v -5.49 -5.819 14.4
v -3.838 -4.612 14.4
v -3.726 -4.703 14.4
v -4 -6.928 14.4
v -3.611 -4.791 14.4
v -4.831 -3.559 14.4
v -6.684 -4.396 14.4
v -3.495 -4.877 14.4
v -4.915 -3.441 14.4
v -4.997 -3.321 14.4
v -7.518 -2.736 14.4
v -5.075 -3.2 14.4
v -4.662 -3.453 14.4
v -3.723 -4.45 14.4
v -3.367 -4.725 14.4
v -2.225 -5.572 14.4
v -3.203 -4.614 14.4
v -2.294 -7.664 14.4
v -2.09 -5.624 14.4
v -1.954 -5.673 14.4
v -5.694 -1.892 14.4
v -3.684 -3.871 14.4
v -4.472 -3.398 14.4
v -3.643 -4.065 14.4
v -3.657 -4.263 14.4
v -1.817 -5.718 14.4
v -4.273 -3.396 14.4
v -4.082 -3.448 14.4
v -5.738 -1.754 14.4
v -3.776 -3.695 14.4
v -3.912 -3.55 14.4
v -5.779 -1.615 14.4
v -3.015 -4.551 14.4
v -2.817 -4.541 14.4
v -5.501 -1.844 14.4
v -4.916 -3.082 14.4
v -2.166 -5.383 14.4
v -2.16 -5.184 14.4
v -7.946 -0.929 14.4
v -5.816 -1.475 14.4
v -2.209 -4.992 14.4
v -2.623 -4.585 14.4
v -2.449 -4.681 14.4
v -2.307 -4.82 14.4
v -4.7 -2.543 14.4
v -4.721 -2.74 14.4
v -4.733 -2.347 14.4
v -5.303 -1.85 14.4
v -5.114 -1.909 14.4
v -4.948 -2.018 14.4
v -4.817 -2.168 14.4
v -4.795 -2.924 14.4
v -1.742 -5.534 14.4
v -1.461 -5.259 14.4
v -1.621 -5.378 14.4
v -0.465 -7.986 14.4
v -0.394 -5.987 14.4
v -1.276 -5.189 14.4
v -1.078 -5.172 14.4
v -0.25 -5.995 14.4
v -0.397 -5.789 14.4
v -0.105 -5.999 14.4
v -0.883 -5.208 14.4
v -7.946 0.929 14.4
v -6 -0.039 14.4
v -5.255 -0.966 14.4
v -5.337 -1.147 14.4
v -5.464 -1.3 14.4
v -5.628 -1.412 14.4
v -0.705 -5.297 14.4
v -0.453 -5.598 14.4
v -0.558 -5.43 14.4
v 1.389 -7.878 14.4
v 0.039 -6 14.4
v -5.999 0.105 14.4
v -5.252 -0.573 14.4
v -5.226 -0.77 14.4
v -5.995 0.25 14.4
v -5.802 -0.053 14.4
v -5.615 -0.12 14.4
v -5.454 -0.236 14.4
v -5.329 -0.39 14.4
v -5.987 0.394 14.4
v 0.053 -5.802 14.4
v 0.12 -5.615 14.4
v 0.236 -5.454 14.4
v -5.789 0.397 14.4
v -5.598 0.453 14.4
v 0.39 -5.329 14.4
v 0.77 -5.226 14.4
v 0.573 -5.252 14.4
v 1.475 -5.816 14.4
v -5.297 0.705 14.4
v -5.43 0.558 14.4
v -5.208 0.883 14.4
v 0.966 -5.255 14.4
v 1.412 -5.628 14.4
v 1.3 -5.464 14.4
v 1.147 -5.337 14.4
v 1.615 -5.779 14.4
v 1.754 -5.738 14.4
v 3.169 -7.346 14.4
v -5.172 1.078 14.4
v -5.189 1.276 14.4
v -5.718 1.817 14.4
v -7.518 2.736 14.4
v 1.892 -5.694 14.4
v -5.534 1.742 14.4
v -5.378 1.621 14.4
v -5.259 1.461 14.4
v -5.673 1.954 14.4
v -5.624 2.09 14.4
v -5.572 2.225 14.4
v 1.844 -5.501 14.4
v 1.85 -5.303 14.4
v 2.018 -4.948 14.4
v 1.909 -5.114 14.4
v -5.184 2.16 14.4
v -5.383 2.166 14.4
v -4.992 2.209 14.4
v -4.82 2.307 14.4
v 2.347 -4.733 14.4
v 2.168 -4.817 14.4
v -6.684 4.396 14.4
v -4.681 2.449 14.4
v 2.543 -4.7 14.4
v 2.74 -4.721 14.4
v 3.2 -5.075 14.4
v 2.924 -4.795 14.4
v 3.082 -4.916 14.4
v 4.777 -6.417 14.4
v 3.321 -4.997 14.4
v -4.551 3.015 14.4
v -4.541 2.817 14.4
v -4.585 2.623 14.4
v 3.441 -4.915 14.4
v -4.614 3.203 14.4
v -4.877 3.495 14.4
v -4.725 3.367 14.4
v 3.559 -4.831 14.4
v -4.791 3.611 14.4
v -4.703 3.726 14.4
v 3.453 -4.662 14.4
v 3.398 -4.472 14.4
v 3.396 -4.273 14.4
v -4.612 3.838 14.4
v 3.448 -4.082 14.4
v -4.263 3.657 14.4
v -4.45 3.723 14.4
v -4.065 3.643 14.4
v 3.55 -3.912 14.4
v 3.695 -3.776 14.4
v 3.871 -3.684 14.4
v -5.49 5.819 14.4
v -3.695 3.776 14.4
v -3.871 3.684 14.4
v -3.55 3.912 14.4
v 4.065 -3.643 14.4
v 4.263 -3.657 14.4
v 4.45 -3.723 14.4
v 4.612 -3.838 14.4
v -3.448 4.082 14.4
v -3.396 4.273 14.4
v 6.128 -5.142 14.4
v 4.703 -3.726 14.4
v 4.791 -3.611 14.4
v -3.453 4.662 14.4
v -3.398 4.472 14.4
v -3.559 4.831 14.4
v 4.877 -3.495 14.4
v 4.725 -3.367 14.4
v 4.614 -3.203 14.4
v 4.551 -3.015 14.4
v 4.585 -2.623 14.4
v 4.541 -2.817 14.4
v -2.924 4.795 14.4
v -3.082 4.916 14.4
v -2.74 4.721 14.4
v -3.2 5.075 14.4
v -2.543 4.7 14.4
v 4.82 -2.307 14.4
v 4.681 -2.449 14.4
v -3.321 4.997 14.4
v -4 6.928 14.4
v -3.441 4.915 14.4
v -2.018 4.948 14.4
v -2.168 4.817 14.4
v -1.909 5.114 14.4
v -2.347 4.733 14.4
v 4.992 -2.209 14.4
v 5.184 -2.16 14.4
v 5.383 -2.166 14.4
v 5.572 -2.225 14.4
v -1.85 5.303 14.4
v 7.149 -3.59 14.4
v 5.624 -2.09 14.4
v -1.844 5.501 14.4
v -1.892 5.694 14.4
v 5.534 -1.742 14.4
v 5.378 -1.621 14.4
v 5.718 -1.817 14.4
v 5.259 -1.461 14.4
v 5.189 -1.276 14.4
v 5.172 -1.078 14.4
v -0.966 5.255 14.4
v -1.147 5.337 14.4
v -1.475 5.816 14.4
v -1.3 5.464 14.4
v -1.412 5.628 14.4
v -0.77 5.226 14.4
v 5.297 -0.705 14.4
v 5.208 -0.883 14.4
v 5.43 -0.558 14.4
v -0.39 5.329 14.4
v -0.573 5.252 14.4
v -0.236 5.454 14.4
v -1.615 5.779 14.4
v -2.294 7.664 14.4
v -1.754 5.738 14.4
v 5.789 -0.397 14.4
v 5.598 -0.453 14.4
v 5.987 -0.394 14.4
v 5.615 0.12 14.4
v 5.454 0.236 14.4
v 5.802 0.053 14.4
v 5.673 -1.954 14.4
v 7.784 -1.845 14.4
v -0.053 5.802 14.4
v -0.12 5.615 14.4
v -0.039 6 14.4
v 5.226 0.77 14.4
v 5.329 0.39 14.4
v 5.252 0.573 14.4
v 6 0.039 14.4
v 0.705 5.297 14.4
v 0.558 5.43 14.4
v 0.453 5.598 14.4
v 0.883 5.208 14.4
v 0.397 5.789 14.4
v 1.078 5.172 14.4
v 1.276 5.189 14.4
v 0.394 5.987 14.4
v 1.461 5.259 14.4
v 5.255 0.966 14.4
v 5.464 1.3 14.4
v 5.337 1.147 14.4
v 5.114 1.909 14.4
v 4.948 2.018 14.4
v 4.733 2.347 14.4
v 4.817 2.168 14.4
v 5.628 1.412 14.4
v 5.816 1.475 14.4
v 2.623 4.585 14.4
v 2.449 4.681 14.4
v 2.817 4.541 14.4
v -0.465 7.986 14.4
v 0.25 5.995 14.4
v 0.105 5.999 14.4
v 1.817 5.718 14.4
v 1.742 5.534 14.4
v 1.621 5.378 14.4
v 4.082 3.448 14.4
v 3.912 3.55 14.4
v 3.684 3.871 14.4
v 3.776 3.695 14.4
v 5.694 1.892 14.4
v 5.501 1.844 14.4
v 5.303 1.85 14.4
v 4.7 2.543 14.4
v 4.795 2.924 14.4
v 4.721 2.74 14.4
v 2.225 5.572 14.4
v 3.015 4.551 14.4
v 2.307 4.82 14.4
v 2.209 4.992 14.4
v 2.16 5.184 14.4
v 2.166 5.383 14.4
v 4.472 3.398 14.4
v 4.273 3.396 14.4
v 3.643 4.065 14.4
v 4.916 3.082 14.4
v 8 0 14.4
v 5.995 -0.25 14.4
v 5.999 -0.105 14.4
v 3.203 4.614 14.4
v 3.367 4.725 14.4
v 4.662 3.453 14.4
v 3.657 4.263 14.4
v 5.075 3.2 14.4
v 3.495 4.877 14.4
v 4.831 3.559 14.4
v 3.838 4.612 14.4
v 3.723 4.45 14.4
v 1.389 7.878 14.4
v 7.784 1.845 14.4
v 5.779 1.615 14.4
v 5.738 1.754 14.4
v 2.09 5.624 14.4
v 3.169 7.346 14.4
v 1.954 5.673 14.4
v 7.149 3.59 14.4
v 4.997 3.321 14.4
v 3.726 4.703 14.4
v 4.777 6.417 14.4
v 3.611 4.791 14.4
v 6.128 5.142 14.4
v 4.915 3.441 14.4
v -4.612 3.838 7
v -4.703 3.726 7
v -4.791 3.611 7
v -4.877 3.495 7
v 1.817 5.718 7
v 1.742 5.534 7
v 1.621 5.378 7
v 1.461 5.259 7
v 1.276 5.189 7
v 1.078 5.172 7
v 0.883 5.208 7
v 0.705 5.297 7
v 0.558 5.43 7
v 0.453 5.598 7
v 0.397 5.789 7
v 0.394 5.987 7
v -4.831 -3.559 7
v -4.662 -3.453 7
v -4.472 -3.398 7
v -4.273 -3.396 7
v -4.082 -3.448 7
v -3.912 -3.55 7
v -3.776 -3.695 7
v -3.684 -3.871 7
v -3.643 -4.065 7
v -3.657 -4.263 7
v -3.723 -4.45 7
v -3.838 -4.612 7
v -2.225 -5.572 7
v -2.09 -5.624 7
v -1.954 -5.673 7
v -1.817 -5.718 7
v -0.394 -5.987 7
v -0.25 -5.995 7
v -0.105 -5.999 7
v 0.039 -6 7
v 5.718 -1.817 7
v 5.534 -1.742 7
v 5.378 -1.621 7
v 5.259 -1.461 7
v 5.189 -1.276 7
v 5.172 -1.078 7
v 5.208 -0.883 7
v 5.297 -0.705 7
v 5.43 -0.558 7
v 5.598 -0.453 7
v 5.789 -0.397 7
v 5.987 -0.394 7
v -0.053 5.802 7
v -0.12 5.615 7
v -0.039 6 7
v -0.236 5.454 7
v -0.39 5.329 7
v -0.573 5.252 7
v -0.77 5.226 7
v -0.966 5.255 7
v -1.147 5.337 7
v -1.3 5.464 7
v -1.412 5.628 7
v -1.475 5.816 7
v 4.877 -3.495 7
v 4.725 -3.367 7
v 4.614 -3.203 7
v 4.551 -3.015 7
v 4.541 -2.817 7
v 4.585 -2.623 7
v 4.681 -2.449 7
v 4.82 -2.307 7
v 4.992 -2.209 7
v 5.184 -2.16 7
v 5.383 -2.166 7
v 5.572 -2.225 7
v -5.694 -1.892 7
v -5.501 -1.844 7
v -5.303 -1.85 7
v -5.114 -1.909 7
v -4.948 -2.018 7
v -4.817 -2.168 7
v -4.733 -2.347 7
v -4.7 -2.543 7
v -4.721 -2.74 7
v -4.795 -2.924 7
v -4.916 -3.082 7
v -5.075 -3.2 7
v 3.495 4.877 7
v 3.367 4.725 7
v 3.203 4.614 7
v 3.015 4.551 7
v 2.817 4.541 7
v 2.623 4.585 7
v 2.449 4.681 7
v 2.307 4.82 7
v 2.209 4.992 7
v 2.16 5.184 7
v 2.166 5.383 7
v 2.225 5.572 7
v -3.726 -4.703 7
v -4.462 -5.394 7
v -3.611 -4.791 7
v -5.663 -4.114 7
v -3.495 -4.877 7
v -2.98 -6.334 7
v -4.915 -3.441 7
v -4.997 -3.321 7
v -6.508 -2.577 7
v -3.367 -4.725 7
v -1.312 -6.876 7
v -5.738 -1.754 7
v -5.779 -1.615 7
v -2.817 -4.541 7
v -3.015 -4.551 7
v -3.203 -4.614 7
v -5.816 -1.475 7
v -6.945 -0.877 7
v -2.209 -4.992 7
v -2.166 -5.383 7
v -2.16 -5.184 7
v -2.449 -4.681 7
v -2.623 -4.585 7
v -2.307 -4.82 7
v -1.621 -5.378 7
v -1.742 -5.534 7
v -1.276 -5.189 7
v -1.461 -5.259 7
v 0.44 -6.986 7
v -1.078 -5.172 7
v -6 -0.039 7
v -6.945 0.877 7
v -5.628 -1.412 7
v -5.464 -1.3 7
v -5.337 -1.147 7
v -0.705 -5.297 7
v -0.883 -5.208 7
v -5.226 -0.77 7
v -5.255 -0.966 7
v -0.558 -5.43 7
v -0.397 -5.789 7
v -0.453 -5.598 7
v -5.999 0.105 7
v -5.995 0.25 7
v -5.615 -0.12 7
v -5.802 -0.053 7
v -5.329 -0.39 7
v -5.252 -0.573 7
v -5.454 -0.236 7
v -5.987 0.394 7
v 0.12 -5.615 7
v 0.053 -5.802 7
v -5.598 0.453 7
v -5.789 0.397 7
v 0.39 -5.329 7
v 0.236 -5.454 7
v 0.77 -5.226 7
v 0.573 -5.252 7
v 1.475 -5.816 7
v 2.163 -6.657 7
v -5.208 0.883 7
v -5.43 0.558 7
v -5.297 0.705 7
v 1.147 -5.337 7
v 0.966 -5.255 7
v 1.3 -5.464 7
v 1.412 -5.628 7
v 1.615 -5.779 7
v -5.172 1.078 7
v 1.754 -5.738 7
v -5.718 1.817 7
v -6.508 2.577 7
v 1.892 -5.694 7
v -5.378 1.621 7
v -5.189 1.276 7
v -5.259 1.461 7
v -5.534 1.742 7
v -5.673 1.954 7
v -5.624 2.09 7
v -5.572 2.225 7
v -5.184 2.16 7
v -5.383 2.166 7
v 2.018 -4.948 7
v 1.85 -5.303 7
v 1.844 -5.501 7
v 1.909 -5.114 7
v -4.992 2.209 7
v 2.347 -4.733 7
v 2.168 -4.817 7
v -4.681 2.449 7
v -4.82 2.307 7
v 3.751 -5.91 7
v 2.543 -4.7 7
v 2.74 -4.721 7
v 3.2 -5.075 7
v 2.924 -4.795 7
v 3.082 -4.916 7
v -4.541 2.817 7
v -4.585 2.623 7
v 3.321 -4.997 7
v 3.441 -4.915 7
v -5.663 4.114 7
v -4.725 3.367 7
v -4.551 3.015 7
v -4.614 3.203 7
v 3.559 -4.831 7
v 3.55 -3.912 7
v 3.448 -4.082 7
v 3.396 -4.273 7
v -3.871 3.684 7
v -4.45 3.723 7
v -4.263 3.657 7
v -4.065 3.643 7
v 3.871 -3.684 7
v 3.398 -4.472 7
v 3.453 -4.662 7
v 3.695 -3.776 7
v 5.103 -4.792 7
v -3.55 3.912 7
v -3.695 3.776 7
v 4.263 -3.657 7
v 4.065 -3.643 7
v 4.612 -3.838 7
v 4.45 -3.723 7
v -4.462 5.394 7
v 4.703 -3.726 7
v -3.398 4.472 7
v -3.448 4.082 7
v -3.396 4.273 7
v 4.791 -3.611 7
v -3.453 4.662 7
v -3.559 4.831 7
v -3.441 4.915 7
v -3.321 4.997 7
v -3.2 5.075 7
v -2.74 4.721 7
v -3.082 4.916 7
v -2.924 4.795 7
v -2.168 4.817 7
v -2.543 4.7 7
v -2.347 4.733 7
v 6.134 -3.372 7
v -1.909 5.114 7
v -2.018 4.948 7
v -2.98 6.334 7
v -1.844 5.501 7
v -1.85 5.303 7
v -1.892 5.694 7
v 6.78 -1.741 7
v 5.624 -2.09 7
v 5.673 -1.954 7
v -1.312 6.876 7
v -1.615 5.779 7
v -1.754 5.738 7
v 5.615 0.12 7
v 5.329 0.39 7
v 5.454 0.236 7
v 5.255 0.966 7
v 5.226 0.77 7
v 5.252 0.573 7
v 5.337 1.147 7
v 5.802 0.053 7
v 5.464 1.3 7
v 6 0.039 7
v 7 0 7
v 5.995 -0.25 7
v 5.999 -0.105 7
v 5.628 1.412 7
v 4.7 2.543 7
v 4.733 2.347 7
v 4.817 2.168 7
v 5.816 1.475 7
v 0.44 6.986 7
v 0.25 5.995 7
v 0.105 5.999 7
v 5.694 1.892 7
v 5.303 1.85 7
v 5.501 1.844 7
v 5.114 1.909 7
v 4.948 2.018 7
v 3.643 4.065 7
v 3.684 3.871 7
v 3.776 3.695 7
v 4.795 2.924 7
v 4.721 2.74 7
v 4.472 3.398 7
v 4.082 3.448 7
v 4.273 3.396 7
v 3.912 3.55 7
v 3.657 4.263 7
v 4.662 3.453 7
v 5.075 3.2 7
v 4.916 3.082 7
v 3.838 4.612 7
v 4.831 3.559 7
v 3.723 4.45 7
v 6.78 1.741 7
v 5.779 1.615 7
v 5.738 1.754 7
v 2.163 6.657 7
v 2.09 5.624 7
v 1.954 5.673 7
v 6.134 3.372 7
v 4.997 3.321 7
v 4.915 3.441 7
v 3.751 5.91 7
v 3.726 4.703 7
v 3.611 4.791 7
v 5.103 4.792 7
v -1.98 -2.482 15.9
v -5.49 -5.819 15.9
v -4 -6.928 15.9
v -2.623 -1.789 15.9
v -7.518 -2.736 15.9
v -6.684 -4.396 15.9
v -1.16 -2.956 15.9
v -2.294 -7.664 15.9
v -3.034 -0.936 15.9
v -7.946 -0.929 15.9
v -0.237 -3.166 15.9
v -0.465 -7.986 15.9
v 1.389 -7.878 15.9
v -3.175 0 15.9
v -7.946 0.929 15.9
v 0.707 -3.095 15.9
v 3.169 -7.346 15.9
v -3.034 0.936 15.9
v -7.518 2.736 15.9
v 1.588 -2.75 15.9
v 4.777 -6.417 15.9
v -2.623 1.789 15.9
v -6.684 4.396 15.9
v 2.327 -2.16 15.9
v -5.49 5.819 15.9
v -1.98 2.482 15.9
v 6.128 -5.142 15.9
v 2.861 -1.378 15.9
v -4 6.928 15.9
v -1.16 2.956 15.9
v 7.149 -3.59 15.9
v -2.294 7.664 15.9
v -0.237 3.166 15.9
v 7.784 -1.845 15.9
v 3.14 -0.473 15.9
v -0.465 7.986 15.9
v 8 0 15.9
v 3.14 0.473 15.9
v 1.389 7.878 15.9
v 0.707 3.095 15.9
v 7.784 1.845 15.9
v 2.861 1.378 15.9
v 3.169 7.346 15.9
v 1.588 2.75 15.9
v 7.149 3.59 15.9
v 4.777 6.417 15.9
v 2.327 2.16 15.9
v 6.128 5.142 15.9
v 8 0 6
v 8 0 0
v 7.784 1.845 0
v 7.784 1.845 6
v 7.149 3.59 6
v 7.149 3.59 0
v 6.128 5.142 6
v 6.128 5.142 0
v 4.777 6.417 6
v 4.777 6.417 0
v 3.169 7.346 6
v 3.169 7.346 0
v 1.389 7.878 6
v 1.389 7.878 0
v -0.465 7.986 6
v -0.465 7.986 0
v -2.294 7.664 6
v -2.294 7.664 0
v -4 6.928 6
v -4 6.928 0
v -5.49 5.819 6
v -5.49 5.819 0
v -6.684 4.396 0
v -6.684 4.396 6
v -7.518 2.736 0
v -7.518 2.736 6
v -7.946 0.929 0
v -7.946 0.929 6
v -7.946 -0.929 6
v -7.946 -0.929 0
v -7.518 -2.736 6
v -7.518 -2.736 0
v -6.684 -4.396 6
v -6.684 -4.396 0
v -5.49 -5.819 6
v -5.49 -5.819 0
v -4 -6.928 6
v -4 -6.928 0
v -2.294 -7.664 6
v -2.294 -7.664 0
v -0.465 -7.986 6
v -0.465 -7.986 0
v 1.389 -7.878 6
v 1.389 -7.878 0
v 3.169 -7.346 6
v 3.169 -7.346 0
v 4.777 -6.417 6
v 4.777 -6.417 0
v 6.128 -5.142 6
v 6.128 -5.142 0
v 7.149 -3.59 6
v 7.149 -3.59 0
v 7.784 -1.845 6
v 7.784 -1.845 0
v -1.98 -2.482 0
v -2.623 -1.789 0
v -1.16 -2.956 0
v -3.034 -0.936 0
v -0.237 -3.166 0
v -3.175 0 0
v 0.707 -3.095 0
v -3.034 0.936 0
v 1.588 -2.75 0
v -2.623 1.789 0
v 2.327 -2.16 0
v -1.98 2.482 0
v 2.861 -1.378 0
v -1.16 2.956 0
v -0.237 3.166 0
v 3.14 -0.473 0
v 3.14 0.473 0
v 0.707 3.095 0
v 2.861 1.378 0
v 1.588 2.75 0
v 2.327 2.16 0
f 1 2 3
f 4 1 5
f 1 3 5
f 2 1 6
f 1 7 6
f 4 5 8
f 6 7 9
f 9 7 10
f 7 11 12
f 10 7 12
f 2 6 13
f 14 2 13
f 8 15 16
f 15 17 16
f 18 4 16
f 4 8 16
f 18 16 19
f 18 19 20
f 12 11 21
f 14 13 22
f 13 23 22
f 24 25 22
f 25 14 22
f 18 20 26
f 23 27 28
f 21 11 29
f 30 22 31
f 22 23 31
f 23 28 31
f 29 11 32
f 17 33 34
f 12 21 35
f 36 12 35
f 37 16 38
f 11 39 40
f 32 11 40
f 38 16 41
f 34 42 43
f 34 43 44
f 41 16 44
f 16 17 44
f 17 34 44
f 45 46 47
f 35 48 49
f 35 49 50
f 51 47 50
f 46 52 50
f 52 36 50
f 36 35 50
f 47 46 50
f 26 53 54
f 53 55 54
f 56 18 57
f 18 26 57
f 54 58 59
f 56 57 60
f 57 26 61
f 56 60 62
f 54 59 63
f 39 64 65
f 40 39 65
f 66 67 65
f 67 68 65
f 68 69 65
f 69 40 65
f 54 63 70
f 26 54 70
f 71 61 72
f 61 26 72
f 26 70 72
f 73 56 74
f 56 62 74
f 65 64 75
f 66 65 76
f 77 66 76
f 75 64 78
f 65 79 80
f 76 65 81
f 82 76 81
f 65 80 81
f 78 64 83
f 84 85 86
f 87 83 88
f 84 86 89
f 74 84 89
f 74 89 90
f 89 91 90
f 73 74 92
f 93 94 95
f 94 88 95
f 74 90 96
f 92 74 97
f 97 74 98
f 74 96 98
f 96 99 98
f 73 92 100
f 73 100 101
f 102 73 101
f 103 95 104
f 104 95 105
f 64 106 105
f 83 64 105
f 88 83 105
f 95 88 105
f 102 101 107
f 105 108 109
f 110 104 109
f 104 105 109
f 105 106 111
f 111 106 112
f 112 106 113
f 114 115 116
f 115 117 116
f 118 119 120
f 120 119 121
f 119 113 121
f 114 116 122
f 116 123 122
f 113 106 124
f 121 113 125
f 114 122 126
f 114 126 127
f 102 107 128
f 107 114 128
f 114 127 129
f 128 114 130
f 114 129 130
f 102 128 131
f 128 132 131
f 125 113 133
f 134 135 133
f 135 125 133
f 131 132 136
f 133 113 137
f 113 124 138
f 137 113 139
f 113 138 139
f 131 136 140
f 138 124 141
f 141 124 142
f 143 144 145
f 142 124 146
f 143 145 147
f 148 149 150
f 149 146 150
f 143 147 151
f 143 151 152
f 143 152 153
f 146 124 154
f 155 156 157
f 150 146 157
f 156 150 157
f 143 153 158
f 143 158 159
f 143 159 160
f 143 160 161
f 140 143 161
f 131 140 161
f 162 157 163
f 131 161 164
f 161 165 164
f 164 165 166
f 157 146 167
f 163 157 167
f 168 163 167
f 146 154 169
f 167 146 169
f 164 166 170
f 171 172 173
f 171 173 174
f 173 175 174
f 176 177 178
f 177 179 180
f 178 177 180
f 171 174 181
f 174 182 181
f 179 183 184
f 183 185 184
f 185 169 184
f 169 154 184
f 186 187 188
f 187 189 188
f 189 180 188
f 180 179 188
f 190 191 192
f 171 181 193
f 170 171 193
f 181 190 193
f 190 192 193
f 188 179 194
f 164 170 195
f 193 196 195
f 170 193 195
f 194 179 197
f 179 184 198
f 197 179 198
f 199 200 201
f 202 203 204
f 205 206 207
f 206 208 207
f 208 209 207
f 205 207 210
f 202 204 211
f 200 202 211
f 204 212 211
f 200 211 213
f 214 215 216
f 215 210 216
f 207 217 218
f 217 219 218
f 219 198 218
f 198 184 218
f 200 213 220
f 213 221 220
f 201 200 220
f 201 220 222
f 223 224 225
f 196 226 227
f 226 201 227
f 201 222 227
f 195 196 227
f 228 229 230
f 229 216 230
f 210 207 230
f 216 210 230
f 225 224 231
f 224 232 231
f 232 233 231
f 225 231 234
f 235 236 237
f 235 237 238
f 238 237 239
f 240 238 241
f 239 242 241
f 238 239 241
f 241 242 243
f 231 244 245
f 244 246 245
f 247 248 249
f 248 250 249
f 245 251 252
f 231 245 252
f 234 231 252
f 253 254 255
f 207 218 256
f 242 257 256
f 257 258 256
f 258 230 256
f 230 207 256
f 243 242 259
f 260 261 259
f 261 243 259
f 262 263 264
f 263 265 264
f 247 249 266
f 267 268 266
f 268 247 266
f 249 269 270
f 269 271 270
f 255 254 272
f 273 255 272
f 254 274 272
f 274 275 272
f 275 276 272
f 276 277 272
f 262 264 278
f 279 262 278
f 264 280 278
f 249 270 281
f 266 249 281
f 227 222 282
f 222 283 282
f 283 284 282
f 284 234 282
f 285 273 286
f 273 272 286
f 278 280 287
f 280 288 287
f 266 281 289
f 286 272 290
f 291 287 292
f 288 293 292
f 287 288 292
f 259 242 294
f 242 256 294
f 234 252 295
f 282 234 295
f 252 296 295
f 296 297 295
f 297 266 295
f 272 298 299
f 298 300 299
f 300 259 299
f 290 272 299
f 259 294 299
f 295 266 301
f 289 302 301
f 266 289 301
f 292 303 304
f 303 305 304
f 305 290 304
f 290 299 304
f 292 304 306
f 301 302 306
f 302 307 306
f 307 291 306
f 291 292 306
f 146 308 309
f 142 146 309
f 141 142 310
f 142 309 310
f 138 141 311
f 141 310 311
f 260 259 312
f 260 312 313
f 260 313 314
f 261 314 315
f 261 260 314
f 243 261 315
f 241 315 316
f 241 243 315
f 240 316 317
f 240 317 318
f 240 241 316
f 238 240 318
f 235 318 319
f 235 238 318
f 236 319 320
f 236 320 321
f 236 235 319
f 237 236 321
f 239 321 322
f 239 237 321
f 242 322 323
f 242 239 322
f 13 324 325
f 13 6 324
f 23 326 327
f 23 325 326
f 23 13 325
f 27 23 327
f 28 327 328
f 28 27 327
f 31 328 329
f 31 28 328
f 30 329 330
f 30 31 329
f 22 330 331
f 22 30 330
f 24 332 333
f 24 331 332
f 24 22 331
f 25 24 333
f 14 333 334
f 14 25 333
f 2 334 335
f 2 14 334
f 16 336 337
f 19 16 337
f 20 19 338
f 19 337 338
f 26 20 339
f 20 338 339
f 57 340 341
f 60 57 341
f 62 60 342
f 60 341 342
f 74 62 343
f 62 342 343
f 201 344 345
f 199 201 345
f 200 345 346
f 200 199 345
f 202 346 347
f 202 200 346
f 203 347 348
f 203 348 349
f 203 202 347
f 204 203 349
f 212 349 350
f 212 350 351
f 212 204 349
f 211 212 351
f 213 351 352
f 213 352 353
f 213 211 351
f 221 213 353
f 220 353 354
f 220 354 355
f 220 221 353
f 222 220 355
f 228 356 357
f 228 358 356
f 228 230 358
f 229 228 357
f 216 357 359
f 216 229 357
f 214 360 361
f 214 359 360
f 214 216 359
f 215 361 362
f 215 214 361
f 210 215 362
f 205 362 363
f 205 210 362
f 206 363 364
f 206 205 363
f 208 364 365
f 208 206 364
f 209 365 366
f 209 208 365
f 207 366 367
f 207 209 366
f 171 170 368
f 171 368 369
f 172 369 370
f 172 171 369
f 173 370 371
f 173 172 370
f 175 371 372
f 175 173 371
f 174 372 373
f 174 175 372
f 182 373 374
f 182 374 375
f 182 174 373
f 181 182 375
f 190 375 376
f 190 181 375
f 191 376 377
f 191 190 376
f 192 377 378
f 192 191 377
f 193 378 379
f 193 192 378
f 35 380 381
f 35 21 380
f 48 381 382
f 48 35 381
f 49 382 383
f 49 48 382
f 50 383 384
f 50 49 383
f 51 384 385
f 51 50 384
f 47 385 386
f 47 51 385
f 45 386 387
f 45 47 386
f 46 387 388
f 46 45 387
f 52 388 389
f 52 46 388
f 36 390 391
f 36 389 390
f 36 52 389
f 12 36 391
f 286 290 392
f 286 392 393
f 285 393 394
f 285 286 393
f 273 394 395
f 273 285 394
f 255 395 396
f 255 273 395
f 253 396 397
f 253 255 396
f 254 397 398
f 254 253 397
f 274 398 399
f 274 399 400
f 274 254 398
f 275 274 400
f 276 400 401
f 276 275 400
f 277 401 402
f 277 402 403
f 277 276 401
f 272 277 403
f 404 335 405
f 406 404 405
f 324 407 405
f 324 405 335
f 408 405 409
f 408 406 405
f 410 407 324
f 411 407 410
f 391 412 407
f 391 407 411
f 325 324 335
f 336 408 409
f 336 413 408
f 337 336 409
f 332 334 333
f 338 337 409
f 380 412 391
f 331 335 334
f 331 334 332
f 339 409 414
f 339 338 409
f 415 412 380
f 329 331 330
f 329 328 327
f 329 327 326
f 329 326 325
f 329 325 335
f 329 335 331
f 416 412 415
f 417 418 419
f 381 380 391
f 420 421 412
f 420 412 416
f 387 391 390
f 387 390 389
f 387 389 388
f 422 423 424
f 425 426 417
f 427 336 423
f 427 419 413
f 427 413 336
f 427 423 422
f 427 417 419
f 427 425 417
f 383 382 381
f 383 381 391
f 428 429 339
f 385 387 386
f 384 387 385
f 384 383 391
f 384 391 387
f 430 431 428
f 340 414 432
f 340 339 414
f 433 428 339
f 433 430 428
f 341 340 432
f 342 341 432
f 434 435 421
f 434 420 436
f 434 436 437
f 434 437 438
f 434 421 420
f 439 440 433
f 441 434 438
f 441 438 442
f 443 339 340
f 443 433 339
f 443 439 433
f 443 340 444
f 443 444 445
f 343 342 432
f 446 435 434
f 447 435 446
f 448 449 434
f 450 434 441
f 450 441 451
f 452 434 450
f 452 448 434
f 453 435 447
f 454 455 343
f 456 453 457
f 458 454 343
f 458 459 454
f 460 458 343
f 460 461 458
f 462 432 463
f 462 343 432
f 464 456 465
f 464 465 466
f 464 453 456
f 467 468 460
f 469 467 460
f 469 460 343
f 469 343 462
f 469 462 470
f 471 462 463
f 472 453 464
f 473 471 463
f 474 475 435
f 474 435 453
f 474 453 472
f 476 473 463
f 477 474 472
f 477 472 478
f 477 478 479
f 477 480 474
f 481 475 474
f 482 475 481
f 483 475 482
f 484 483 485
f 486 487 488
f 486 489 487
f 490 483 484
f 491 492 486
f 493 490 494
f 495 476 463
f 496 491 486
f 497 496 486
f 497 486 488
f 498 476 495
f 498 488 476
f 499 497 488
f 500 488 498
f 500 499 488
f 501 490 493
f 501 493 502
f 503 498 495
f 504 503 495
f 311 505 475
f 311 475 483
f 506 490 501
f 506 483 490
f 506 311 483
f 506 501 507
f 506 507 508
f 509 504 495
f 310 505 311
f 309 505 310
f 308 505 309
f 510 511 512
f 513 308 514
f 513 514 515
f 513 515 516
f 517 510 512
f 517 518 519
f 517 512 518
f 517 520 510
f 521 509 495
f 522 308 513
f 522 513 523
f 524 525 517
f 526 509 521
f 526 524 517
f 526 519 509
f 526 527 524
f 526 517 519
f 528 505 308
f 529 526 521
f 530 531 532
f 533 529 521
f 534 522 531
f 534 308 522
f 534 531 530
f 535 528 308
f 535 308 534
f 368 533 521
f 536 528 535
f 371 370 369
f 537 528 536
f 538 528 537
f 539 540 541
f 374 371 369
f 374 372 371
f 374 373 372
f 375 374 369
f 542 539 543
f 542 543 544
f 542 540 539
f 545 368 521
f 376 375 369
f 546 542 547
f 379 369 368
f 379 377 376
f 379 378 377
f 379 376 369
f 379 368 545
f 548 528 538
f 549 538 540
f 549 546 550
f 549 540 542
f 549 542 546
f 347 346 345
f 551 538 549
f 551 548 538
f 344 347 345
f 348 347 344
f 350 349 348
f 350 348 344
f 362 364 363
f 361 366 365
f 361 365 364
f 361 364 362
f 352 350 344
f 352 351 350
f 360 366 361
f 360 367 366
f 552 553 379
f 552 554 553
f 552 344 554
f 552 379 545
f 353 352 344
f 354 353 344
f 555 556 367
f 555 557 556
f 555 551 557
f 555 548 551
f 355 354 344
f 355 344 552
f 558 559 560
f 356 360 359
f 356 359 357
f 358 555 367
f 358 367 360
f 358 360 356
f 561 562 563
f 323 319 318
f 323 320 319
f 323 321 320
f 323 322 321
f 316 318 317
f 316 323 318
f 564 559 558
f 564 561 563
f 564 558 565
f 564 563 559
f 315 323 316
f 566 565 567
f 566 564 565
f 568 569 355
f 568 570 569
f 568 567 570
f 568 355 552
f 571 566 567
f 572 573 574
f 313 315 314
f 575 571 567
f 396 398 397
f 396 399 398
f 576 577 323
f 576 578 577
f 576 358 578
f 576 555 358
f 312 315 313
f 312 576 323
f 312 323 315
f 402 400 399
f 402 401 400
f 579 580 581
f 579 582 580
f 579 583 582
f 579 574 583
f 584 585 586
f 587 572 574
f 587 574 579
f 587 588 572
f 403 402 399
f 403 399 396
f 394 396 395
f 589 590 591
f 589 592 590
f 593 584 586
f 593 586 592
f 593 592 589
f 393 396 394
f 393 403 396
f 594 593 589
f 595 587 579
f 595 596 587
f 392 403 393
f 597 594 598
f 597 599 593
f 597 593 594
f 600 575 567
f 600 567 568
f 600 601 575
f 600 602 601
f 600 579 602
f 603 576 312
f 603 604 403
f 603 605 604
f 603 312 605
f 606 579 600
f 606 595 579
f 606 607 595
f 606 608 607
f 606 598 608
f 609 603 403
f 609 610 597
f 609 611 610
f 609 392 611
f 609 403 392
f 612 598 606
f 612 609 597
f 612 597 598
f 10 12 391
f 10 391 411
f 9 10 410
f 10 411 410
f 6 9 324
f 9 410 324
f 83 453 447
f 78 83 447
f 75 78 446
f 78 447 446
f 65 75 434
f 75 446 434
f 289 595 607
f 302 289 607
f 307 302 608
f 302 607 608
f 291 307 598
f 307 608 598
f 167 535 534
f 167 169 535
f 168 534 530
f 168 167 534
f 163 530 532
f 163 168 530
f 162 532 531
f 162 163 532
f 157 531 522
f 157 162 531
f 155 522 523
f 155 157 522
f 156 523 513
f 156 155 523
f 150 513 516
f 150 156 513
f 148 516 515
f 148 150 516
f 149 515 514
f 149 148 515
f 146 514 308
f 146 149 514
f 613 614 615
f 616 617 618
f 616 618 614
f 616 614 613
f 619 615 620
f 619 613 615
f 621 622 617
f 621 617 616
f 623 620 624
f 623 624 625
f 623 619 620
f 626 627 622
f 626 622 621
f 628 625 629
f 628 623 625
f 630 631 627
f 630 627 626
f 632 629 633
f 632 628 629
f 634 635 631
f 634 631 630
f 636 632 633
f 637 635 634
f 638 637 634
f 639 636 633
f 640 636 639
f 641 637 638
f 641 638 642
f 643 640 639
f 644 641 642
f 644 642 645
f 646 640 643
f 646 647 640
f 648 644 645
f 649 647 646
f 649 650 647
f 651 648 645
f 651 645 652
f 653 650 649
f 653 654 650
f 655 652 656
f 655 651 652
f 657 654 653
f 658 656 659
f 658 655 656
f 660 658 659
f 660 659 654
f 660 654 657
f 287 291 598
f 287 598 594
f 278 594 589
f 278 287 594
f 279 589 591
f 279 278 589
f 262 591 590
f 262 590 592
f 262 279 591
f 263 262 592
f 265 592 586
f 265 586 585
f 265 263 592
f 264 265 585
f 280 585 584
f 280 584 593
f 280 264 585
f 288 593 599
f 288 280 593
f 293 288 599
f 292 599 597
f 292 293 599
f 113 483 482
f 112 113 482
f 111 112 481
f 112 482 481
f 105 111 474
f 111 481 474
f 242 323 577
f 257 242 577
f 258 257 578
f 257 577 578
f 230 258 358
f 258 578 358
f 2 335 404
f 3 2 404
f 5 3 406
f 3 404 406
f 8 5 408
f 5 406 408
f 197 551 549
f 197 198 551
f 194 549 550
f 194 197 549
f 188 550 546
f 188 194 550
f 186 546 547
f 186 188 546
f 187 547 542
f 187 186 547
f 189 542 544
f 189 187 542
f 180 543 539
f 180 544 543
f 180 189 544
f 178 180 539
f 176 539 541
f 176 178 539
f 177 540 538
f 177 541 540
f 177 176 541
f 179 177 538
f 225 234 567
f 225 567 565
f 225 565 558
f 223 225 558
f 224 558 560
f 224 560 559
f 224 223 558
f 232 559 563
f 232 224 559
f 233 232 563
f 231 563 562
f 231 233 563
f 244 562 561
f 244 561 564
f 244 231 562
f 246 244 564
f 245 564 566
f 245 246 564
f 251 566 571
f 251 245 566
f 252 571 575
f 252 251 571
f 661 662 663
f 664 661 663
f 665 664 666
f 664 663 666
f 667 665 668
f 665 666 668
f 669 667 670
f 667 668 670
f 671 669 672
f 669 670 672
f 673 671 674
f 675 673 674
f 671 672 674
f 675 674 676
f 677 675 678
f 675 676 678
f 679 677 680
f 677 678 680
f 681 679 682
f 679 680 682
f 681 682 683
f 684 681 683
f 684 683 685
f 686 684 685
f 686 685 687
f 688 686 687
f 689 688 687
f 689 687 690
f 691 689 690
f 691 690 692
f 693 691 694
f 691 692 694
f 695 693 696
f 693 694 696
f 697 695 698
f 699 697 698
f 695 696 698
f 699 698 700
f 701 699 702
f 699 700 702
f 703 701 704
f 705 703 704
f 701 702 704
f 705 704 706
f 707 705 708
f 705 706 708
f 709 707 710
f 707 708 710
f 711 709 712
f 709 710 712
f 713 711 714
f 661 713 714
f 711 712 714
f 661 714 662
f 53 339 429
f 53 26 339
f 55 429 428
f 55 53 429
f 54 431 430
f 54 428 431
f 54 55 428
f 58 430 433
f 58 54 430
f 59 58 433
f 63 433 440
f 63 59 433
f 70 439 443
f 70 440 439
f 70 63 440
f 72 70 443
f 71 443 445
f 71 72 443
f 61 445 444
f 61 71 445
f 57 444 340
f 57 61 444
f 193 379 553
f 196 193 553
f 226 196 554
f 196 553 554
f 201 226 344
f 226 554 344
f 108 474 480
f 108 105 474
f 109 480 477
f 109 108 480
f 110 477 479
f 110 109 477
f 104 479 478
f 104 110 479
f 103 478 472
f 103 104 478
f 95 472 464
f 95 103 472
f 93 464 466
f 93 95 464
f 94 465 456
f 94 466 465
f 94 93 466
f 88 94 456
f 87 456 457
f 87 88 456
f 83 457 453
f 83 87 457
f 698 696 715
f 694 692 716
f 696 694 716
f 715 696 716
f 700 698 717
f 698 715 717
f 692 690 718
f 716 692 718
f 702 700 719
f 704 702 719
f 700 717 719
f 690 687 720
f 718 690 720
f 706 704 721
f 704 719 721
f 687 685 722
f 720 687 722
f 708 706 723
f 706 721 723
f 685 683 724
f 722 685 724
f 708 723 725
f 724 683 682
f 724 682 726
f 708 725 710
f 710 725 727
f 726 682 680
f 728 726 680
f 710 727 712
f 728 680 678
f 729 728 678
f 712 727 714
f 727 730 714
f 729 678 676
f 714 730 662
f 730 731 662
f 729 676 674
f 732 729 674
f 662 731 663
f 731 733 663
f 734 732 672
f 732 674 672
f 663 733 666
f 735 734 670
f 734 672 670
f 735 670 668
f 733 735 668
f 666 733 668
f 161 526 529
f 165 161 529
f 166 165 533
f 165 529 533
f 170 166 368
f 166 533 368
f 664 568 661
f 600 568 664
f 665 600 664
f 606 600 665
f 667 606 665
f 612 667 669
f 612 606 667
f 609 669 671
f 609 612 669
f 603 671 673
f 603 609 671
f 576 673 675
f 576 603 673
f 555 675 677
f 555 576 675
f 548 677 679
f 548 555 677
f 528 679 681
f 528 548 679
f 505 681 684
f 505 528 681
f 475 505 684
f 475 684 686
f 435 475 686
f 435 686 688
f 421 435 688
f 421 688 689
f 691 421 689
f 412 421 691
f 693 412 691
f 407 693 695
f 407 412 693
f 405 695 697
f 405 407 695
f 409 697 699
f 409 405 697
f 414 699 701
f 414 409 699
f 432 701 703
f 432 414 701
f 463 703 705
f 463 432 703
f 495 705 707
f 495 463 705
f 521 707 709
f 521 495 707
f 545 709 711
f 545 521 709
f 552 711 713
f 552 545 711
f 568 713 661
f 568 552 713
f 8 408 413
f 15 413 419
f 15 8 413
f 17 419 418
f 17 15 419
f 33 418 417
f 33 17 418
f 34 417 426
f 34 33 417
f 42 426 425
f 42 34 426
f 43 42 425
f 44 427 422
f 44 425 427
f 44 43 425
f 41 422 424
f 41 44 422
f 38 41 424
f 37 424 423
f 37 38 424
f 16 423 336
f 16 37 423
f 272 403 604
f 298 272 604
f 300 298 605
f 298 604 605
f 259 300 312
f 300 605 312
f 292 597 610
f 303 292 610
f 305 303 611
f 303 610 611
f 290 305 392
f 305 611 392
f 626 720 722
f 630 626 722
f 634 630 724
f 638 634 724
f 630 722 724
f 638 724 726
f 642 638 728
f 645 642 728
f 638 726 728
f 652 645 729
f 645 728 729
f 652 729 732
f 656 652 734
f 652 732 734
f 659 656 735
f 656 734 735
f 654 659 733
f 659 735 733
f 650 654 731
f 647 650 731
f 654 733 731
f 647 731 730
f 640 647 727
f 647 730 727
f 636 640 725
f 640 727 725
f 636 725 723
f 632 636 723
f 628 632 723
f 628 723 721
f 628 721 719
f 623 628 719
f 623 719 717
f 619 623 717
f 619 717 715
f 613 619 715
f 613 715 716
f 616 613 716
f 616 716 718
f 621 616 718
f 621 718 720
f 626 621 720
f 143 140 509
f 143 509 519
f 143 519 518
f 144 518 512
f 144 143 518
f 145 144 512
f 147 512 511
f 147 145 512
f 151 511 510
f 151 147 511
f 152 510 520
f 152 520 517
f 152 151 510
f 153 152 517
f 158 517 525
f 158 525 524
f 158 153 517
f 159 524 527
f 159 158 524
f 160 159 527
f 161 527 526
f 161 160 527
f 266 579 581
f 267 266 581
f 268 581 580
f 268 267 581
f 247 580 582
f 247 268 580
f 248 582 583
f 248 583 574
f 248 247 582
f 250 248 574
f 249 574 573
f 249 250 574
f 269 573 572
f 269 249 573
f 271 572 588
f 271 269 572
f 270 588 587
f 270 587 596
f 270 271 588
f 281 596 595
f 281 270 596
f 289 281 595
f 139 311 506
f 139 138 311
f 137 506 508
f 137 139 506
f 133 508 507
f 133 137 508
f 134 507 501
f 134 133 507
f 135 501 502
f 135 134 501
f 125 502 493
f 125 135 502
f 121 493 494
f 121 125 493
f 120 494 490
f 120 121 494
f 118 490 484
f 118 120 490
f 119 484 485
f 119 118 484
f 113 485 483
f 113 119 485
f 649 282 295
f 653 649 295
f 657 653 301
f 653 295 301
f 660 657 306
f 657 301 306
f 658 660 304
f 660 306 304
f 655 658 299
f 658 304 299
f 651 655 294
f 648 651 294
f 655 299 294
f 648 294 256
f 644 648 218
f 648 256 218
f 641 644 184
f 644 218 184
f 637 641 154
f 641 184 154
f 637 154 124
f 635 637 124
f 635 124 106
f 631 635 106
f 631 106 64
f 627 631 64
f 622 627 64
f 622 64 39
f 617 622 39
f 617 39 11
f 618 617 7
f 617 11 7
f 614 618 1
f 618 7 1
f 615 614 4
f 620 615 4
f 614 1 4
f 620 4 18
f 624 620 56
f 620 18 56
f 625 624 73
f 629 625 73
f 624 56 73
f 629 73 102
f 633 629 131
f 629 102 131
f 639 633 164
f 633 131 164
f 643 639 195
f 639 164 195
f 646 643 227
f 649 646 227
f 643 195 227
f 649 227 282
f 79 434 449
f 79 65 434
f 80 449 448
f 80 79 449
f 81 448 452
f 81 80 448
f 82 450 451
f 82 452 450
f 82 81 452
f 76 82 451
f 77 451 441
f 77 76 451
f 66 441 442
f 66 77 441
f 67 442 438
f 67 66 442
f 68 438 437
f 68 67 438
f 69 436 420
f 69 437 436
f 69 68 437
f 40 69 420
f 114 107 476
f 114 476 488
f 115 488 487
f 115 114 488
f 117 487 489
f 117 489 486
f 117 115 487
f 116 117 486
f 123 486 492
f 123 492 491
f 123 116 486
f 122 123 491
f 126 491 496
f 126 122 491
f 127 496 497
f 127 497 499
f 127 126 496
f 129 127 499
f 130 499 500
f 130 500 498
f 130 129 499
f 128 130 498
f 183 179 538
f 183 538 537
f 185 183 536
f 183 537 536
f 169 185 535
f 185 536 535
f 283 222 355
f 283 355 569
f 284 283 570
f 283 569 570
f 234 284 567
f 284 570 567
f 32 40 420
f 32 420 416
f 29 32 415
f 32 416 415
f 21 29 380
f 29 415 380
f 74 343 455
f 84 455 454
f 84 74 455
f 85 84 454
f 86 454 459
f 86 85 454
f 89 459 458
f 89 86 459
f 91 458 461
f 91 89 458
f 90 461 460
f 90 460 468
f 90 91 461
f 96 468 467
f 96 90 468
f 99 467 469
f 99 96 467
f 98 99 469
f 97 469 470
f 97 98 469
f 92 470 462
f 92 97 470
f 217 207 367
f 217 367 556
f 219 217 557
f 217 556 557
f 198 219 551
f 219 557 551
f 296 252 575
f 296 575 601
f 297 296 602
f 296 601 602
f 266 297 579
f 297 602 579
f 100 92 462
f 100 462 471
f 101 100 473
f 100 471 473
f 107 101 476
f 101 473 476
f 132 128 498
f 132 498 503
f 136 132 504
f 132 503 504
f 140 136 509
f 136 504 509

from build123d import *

# Parameters (mm, degrees)
F0_R     = 8
F1_DEPTH = 7
F2_R     = 6
F3_DEPTH = 7.4
F4_SIZE  = 1
F5_R     = 8
F6_DEPTH = 1.5
F7_R     = 0.725
F8_DEPTH = 7.4
F10_D    = 6.35


with BuildPart() as f1:
    # F0 (on Top) → F1 (new body)
    with BuildSketch(Plane.XY):
        Circle(F0_R)
    extrude(amount=F1_DEPTH)

    # F2 (on face) → F3 (join)
    with BuildSketch(Plane.XY.offset(7)):
        Circle(F2_R)
    extrude(amount=F3_DEPTH)

    # F4
    f4_edges = [f1.edges().sort_by_distance(p)[0] for p in [
        (-8, 0, 7),
    ]]
    chamfer(f4_edges, length=F4_SIZE)

    # F5 (on face) → F6 (join)
    with BuildSketch(Plane.XY.offset(14.4)):
        Circle(F5_R)
    extrude(amount=F6_DEPTH)

    # F7 (on face) → F8 (cut)
    with BuildSketch(Plane(origin=(0, 0, 14.4), x_dir=(1, 0, 0), z_dir=(0, 0, -1))):
        with Locations((-5.4243303263, 2.5644961514)):
            Circle(F7_R)
        with Locations((-5.9513175962, 0.7627705219)):
            Circle(F7_R)
        with Locations((-5.8957484345, -1.1136204009)):
            Circle(F7_R)
        with Locations((-5.2630623379, -2.8810023997)):
            Circle(F7_R)
        with Locations((-4.1151910298, -4.3663718106)):
            Circle(F7_R)
        with Locations((-2.5644961514, -5.4243303263)):
            Circle(F7_R)
        with Locations((-0.7627705219, -5.9513175962)):
            Circle(F7_R)
        with Locations((1.1136204009, -5.8957484345)):
            Circle(F7_R)
        with Locations((2.8810023997, -5.2630623379)):
            Circle(F7_R)
        with Locations((4.3663718106, -4.1151910298)):
            Circle(F7_R)
        with Locations((5.4243303263, -2.5644961514)):
            Circle(F7_R)
        with Locations((5.9513175962, -0.7627705219)):
            Circle(F7_R)
        with Locations((5.8957484345, 1.1136204009)):
            Circle(F7_R)
        with Locations((5.2630623379, 2.8810023997)):
            Circle(F7_R)
        with Locations((4.1151910298, 4.3663718106)):
            Circle(F7_R)
        with Locations((2.5644961514, 5.4243303263)):
            Circle(F7_R)
        with Locations((0.7627705219, 5.9513175962)):
            Circle(F7_R)
        with Locations((-1.1136204009, 5.8957484345)):
            Circle(F7_R)
        with Locations((-2.8810023997, 5.2630623379)):
            Circle(F7_R)
        with Locations((-4.3663718106, 4.1151910298)):
            Circle(F7_R)
    extrude(amount=F8_DEPTH, mode=Mode.SUBTRACT)

    # F10 (through all)
    with Locations(Plane.XY.offset(15.9)):
        with Locations((0, 0)):
            Hole(F10_D / 2)


solid = f1.part
